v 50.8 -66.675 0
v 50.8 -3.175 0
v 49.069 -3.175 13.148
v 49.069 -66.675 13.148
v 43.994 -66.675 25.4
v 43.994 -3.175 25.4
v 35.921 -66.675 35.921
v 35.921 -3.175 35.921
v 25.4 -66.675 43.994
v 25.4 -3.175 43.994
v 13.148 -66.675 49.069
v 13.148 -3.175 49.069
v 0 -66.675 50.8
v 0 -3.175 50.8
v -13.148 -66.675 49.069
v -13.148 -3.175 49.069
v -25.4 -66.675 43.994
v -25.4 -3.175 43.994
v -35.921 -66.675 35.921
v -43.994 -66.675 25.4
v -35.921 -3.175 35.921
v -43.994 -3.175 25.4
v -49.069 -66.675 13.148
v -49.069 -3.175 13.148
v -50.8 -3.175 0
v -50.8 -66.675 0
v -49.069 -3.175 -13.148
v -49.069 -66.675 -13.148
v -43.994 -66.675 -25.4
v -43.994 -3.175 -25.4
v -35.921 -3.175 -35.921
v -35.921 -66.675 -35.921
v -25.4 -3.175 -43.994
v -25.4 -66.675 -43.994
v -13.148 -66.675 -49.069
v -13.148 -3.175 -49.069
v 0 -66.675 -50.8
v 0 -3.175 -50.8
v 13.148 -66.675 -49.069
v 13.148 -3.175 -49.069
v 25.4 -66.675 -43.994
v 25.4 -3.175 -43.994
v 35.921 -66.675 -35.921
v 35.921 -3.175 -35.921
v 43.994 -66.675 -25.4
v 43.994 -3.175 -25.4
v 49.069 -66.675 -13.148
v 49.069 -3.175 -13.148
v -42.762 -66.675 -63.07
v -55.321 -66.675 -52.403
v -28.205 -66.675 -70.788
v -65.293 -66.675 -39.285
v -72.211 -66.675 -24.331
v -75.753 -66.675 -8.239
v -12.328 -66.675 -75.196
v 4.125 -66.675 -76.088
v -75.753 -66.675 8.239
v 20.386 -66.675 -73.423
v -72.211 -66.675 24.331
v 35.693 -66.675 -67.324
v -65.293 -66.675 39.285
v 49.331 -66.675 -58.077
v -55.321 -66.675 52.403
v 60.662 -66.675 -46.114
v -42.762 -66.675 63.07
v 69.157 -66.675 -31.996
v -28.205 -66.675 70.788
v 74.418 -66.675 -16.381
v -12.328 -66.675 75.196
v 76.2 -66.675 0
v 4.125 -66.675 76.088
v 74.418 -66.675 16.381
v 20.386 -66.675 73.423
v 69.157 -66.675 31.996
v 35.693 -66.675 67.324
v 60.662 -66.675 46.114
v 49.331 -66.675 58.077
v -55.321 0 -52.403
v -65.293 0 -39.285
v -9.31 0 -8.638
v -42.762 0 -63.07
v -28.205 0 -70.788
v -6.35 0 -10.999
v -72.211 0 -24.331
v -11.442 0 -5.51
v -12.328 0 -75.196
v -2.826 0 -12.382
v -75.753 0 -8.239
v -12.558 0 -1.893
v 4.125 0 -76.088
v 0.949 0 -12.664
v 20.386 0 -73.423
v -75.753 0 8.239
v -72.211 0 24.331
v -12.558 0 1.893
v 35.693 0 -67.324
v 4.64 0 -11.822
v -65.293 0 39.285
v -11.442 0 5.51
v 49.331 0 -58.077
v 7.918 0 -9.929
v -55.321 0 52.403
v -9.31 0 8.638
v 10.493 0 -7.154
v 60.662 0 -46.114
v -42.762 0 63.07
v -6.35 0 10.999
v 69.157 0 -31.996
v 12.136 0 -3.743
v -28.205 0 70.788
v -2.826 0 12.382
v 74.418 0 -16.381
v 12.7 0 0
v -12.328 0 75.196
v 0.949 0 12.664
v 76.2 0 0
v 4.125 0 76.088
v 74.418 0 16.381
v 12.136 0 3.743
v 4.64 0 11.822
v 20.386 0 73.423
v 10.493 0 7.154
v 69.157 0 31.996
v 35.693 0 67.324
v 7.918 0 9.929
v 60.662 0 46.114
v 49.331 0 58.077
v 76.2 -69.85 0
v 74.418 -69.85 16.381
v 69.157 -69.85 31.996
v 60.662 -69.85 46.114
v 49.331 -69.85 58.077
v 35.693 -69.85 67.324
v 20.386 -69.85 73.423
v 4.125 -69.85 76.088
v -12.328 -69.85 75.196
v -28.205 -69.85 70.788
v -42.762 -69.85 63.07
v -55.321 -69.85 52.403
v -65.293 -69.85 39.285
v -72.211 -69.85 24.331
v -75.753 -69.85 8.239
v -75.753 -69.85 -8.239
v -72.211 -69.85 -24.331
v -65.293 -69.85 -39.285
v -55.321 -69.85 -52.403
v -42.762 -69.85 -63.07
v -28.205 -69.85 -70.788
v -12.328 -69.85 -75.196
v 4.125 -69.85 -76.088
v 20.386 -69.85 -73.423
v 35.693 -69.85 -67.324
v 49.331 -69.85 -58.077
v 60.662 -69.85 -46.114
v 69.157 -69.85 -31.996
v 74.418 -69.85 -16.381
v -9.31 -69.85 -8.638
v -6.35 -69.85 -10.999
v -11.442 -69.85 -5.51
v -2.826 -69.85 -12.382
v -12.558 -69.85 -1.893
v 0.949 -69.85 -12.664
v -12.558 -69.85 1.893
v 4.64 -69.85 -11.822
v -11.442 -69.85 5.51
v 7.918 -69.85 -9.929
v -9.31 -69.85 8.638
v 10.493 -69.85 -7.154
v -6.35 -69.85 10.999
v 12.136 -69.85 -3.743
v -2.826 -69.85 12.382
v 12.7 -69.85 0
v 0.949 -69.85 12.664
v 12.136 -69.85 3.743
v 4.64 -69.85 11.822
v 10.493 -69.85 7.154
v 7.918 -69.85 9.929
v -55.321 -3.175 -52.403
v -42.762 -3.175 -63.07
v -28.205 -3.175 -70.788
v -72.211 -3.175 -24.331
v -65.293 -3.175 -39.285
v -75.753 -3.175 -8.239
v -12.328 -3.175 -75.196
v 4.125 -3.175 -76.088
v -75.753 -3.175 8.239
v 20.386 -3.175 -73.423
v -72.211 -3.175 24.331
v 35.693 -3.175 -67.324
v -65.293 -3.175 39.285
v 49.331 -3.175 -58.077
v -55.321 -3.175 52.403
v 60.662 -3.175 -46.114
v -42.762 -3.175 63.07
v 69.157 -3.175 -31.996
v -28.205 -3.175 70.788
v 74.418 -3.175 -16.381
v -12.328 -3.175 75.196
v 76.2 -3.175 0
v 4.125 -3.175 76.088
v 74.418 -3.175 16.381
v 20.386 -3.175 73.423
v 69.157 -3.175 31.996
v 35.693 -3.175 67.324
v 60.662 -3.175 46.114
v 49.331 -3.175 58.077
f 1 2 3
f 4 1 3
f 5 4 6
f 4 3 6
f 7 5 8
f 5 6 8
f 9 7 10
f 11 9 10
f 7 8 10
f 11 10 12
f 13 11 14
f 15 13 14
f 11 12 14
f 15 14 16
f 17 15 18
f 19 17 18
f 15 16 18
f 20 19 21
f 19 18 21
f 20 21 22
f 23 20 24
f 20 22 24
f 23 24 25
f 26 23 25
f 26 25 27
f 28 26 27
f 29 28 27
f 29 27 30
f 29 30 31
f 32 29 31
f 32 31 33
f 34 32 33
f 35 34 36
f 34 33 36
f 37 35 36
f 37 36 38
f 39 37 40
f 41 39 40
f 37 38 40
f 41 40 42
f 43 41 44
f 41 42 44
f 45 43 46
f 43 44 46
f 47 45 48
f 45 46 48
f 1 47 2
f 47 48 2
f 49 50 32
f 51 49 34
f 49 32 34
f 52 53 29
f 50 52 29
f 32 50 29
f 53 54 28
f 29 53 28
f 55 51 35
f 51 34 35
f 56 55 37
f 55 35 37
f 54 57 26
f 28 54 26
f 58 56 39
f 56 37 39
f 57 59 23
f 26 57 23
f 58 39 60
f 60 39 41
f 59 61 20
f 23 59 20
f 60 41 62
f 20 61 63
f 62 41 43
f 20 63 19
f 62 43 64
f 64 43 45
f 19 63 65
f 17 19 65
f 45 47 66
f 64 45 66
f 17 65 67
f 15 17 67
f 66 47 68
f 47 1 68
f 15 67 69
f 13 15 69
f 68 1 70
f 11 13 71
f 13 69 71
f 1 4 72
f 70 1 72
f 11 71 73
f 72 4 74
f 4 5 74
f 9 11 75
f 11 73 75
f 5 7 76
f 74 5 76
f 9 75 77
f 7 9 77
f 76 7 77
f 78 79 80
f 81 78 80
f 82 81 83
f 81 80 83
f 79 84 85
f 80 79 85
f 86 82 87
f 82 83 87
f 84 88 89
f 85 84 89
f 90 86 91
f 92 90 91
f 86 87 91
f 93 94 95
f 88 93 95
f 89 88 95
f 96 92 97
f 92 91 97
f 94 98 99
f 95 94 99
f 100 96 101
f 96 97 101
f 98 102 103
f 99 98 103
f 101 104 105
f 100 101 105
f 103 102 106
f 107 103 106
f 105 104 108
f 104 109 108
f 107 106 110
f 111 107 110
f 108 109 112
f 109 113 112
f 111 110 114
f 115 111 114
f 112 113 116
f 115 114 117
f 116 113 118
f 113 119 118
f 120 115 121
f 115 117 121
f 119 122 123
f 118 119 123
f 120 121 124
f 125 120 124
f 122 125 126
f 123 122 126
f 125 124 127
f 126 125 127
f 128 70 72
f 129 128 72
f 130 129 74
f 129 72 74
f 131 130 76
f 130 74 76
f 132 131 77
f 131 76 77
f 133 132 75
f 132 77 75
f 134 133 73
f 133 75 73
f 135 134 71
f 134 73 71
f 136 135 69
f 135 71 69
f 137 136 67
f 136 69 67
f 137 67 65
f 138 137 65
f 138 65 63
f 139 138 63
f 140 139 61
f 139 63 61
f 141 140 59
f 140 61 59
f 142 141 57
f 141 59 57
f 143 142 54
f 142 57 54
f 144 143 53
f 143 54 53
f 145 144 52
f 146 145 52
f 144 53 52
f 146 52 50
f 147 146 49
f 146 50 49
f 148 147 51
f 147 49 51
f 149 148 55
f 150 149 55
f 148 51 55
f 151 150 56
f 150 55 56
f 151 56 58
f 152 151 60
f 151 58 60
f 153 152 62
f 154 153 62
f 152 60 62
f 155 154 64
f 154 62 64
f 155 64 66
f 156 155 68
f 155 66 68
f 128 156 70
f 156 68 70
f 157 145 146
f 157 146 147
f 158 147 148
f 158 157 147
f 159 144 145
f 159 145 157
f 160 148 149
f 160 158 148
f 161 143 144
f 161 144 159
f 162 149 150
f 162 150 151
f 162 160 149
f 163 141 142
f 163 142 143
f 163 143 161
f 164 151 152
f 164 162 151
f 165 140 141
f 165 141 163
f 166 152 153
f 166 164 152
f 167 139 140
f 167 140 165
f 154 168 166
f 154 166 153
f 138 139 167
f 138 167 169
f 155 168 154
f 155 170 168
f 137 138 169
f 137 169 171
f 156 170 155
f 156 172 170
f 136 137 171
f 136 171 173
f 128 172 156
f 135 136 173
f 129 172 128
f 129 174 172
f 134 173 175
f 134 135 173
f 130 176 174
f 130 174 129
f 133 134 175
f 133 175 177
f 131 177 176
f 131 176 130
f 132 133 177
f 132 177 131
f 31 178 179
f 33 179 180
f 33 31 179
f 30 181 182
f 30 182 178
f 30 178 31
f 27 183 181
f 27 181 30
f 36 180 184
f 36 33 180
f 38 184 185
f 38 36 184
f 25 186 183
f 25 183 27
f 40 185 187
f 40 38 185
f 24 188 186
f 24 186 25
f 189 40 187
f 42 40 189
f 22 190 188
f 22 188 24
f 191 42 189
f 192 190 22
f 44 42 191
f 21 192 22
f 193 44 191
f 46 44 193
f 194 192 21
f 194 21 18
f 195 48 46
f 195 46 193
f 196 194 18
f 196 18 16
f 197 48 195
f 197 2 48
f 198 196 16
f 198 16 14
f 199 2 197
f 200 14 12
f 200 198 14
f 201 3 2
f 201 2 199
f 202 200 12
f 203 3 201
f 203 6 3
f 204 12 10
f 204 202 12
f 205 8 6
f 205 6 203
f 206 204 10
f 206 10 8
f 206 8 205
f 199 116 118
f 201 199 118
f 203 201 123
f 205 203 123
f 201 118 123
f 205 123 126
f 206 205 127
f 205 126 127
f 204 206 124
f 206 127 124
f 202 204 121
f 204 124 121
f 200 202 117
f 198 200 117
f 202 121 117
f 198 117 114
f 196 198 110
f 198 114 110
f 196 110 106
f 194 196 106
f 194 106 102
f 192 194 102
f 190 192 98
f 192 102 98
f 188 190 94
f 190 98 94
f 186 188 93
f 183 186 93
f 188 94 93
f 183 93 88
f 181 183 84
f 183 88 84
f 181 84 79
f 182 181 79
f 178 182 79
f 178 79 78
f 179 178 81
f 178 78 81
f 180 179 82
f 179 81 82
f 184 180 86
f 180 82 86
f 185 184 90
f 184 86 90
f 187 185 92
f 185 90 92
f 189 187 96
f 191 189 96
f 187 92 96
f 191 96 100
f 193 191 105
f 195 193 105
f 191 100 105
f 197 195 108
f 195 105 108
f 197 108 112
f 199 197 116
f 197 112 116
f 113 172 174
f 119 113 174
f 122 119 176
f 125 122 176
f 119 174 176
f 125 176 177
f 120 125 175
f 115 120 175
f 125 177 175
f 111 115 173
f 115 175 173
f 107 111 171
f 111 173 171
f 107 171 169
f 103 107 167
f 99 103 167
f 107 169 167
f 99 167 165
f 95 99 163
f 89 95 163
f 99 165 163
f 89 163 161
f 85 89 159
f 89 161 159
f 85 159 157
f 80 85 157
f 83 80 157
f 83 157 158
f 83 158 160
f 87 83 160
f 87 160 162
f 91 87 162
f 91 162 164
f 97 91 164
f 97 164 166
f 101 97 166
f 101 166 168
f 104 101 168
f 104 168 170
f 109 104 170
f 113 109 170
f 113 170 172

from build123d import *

# Parameters (mm, degrees)
F0_R     = 76.2
F1_DEPTH = 3.175
F2_R     = 50.8
F3_DEPTH = 63.5
F4_R     = 76.2
F5_DEPTH = 3.175
F6_R     = 12.7
F7_DEPTH = 254


with BuildPart() as f1:
    # F0 (on Front) → F1 (new body)
    with BuildSketch(Plane.XZ):
        Circle(F0_R)
    extrude(amount=F1_DEPTH)

    # F2 (on face) → F3 (join)
    with BuildSketch(Plane.XZ.offset(3.175)):
        Circle(F2_R)
    extrude(amount=F3_DEPTH)

    # F4 (on face) → F5 (join)
    with BuildSketch(Plane.XZ.offset(66.675)):
        Circle(F4_R)
    extrude(amount=F5_DEPTH)

    # F6 (on face) → F7 (cut)
    with BuildSketch(Plane.XZ.offset(69.85)):
        Circle(F6_R)
    extrude(amount=-F7_DEPTH, mode=Mode.SUBTRACT)


solid = f1.part
